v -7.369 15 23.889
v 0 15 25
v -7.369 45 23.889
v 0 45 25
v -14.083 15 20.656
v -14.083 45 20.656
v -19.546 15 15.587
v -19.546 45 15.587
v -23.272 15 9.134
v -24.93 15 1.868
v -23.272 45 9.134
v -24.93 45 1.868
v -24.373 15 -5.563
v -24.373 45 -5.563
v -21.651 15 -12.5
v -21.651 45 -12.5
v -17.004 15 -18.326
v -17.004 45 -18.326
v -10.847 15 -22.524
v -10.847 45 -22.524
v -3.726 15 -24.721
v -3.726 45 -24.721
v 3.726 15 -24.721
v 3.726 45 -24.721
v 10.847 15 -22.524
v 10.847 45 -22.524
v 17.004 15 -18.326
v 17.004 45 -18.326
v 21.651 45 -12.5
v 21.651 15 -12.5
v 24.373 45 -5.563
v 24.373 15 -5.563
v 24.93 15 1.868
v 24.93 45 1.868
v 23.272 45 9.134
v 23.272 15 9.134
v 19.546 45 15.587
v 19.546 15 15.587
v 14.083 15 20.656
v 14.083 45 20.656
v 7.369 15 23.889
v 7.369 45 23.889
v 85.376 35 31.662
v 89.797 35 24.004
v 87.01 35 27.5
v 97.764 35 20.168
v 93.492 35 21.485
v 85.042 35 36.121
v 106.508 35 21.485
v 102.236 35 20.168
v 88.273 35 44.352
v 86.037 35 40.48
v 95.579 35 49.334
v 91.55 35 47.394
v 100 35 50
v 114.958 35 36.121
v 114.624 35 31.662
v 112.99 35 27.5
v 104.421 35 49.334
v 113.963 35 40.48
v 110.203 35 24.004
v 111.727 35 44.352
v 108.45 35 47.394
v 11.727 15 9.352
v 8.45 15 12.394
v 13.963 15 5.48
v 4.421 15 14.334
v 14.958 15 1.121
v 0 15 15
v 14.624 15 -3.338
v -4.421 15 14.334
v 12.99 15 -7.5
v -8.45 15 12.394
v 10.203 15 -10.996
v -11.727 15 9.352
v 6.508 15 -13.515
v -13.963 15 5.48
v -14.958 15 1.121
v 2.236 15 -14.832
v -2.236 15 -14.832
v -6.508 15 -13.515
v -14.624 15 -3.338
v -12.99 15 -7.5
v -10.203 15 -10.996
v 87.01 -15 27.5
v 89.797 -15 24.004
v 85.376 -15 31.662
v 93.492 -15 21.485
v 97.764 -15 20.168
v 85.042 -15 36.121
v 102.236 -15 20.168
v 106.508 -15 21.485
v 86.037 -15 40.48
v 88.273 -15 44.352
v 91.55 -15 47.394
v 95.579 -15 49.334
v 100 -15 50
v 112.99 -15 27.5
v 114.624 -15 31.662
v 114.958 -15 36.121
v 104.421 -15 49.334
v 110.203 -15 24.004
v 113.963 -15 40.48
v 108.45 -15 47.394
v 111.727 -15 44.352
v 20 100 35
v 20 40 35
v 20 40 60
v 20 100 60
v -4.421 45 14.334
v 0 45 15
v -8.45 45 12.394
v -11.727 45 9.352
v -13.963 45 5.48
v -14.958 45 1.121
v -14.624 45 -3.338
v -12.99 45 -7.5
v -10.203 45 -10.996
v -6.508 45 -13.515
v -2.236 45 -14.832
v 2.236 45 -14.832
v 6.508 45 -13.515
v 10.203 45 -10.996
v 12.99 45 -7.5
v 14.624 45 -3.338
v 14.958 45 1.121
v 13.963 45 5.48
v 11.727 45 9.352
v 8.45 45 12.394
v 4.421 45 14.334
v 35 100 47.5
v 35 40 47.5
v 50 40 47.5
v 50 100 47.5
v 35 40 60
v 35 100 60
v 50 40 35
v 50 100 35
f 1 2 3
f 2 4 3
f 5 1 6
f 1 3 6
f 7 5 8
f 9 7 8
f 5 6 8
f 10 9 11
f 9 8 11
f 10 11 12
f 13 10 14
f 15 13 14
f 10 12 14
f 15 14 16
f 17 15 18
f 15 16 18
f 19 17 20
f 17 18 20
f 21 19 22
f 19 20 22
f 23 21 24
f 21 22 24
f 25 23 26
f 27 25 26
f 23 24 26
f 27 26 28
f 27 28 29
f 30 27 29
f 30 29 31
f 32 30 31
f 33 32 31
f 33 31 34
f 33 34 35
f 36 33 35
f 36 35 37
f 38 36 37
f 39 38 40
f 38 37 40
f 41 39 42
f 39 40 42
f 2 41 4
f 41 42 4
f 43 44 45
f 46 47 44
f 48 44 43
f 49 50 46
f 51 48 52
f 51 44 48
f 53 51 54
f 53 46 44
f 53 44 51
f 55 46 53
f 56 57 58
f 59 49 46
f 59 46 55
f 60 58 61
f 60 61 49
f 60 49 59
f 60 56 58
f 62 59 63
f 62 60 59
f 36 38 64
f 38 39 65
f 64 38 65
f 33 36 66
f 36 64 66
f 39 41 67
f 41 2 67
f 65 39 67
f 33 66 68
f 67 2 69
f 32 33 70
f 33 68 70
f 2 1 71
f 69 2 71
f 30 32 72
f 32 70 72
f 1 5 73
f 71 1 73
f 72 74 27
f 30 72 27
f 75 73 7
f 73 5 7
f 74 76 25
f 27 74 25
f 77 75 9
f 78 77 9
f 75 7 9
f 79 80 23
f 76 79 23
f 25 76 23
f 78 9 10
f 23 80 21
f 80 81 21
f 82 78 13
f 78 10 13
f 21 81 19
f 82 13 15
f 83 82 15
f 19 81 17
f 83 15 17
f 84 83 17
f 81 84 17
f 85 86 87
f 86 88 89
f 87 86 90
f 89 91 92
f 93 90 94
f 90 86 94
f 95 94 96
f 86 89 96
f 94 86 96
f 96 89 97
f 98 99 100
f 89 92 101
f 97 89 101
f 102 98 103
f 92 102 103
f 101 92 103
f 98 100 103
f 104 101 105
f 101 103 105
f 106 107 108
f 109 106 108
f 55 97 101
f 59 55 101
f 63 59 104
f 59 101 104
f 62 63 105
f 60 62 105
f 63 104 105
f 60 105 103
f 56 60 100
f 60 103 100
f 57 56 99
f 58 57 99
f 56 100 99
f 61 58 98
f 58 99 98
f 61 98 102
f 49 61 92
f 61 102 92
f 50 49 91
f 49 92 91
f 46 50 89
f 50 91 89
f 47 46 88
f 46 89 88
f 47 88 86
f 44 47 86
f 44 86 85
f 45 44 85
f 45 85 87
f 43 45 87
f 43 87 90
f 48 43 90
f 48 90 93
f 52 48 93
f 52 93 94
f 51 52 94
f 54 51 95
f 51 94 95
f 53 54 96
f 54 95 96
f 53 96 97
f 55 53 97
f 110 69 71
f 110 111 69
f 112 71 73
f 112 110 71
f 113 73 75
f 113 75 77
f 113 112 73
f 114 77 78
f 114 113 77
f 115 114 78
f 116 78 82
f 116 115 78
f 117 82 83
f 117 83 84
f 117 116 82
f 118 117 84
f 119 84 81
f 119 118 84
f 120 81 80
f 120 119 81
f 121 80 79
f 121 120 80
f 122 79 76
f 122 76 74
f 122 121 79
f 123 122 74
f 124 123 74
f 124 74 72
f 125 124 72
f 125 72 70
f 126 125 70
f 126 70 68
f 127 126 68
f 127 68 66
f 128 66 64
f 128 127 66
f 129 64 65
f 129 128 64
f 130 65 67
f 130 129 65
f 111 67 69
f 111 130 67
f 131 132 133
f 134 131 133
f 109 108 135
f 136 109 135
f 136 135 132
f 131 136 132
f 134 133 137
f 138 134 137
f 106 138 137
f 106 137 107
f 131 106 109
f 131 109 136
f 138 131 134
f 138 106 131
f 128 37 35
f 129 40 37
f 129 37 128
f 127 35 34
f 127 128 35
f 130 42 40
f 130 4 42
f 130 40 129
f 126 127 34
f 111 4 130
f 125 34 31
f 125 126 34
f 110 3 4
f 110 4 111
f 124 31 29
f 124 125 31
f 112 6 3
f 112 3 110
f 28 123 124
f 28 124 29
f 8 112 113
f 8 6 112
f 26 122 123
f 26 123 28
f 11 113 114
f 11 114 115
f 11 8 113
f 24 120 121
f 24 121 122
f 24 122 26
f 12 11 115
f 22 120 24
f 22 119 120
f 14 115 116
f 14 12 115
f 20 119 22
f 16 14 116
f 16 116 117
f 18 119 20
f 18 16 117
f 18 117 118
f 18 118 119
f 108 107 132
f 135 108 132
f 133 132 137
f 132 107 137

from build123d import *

# Parameters (mm, degrees)
P_IDAT_START            = 40
P_IDAT_VYSUNUT_M1_DEPTH = 60
P_IDAT_START_2          = -15
SKICA2_R                = 15
P_IDAT_VYSUNUT_M2_DEPTH = 50
SKICA4_W                = 10
SKICA4_H                = 30


with BuildPart() as part:
    # Skica1 → Přidat vysunutím1 (new body)
    with BuildSketch(Plane(origin=(0, 0, 0), x_dir=(1, 0, 0), z_dir=(0, 1, 0)).offset(P_IDAT_START)):
        Polygon((50, -35), (20, -35), (20, -60), (35, -60), (35, -47.5), (50, -47.5), align=None)
    extrude(amount=P_IDAT_VYSUNUT_M1_DEPTH)


with BuildPart() as body_2:
    # Skica2 → Přidat vysunutím2 (new body)
    with BuildSketch(Plane(origin=(0, 0, 0), x_dir=(1, 0, 0), z_dir=(0, 1, 0)).offset(P_IDAT_START_2)):
        with Locations(Location((100, -35, 0), (0, 0, 270))):
            Circle(SKICA2_R)
    extrude(amount=P_IDAT_VYSUNUT_M2_DEPTH)


with BuildPart() as body_3:
    # Skica4 → Rotovat1 (revolve)
    with BuildSketch(Plane.XY, mode=Mode.PRIVATE) as rotovat1_sk:
        with Locations((20, 30)):
            Rectangle(SKICA4_W, SKICA4_H)
    revolve(rotovat1_sk.sketch.rotate(Axis((0, 85.855571494, 0), (0, -1, 0)), 90), axis=Axis((0, 85.855571494, 0), (0, -1, 0)))


solid = Compound([part.part, body_2.part, body_3.part])
